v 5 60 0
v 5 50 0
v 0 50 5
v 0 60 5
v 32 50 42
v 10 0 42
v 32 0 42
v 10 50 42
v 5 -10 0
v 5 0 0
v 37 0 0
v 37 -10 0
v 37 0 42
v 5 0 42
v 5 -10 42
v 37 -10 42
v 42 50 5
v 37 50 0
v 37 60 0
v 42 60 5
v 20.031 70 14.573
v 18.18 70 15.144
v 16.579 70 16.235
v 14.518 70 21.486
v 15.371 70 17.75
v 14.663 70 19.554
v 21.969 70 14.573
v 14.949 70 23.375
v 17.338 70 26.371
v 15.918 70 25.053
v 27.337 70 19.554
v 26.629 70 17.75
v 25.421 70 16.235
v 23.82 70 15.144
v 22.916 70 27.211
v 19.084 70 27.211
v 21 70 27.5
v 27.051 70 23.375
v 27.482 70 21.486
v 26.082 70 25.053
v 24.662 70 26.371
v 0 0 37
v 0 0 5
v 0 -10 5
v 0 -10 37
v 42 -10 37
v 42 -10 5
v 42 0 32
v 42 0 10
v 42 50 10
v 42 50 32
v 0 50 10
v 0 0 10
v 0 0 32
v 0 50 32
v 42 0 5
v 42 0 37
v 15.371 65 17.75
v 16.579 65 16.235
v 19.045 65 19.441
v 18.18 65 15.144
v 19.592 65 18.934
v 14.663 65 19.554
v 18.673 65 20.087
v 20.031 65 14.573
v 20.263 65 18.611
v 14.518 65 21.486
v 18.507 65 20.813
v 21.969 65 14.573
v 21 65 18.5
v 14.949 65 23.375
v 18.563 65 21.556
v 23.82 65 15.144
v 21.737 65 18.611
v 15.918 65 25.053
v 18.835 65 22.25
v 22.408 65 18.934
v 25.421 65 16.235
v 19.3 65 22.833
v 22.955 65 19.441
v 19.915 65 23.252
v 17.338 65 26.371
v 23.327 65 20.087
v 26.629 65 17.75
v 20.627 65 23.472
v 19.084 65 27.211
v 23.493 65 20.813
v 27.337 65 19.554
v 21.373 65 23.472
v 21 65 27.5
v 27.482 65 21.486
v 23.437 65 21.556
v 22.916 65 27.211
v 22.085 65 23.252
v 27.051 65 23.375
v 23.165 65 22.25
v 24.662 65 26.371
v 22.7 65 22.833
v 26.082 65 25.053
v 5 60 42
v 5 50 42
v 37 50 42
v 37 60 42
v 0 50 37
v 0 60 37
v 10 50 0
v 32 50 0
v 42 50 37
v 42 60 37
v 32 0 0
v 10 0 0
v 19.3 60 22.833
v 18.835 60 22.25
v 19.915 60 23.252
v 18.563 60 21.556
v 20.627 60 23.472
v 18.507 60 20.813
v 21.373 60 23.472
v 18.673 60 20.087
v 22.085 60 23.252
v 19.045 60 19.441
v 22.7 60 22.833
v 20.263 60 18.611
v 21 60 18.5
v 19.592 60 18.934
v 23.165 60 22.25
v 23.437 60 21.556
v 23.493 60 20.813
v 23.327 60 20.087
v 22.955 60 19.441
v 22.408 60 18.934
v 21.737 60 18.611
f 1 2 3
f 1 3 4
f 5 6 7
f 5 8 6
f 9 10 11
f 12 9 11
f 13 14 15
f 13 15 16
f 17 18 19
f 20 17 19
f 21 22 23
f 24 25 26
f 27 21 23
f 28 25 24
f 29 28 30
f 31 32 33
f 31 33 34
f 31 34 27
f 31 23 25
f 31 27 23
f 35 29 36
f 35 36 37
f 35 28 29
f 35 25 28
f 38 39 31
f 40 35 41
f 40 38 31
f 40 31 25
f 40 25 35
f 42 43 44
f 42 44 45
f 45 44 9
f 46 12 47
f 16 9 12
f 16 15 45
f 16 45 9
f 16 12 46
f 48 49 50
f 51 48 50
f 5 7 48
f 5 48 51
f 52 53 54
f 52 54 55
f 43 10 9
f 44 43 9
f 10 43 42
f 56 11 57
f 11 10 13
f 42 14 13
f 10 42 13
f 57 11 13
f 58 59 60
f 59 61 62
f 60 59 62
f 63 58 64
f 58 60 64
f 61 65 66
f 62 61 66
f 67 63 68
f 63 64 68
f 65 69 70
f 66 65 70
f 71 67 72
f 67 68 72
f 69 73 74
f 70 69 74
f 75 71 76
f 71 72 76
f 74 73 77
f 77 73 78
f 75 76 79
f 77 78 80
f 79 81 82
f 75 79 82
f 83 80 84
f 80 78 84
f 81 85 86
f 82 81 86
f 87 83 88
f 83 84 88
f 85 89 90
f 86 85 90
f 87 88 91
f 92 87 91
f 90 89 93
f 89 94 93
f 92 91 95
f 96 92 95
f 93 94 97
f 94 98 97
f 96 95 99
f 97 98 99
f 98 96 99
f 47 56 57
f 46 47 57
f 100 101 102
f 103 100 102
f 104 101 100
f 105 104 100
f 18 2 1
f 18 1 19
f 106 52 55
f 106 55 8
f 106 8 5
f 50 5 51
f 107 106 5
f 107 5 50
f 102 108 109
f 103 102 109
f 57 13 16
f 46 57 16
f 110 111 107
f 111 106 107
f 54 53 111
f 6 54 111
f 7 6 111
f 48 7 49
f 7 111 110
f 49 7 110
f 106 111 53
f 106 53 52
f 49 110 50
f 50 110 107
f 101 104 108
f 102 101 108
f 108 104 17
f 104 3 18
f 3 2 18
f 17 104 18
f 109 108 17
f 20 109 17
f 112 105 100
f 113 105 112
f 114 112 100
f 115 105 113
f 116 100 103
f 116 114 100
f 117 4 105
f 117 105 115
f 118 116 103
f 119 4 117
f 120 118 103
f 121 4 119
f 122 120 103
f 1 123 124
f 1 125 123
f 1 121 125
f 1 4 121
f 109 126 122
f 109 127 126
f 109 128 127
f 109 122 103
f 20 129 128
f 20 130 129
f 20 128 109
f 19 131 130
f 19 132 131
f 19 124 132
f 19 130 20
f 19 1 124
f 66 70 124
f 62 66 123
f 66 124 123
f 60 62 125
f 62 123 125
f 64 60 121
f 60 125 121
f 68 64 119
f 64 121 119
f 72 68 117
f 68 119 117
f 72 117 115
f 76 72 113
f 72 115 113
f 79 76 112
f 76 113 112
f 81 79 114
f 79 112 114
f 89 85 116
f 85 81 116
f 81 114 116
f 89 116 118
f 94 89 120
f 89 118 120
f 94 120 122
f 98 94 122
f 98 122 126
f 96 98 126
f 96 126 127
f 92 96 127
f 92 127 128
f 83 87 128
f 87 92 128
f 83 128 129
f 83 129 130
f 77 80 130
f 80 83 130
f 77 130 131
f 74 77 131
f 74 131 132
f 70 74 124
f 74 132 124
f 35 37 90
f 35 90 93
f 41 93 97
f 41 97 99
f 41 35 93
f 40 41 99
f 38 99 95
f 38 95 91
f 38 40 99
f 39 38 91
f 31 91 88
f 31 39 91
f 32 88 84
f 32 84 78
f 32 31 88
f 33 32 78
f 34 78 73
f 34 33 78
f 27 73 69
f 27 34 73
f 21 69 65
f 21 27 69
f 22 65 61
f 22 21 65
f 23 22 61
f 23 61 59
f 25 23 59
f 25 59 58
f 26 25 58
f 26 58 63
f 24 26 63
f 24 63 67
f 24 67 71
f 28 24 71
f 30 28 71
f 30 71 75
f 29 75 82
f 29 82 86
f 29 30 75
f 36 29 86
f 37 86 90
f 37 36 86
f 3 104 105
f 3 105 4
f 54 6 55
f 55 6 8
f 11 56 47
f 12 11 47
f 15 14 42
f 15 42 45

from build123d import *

# Parameters (mm, degrees)
SKETCH_1_W      = 42
SKETCH_1_H      = 50
EXTRUDE_1_DEPTH = 42
CHAMFER_1_SIZE  = 10
SKETCH_2_W      = 42
SKETCH_2_H      = 42
EXTRUDE_2_DEPTH = 10
SKETCH_3_W      = 42
SKETCH_3_H      = 42
EXTRUDE_3_DEPTH = 10
CHAMFER_2_SIZE  = 5
CHAMFER_3_SIZE  = 5
SKETCH_4_R      = 2.5
EXTRUDE_4_DEPTH = 10
SKETCH_5_R      = 6.5
EXTRUDE_5_DEPTH = 5


with BuildPart() as part:
    # 草圖1 → 填料-伸長1 (new body)
    with BuildSketch(Plane.XY):
        with Locations((21, 25)):
            Rectangle(SKETCH_1_W, SKETCH_1_H)
    extrude(amount=EXTRUDE_1_DEPTH)

    # 導角1
    chamfer_1_edges = [part.edges().sort_by_distance(p)[0] for p in [
        (42, 25, 42),
        (0, 25, 42),
        (42, 25, 0),
        (0, 25, 0),
    ]]
    chamfer(chamfer_1_edges, length=CHAMFER_1_SIZE)


with BuildPart() as body_2:
    # 草圖2 → 填料-伸長2 (new body)
    with BuildSketch(Plane(origin=(0, 50, 0), x_dir=(1, 0, 0), z_dir=(0, 1, 0))):
        with Locations((21, -21)):
            Rectangle(SKETCH_2_W, SKETCH_2_H)
    extrude(amount=EXTRUDE_2_DEPTH)

    # 導角2
    chamfer_2_edges = [body_2.edges().sort_by_distance(p)[0] for p in [
        (0, 55, 0),
        (42, 55, 0),
        (42, 55, 42),
        (0, 55, 42),
    ]]
    chamfer(chamfer_2_edges, length=CHAMFER_2_SIZE)

    # 草圖4 → 填料-伸長4 (add)
    with BuildSketch(Plane(origin=(0, 60, 0), x_dir=(1, 0, 0), z_dir=(0, 1, 0))):
        with Locations(Location((21, -21, 0), (0, 0, 90))):
            Circle(SKETCH_4_R)
    extrude(amount=EXTRUDE_4_DEPTH)

    # 草圖5 → 填料-伸長5 (add)
    with BuildSketch(Plane(origin=(0, 70, 0), x_dir=(1, 0, 0), z_dir=(0, 1, 0))):
        with Locations(Location((21, -21, 0), (0, 0, 270))):
            Circle(SKETCH_5_R)
    extrude(amount=-EXTRUDE_5_DEPTH)


with BuildPart() as body_3:
    # 草圖3 → 填料-伸長3 (new body)
    with BuildSketch(Plane.XZ):
        with Locations((21, 21)):
            Rectangle(SKETCH_3_W, SKETCH_3_H)
    extrude(amount=EXTRUDE_3_DEPTH)

    # 導角3
    chamfer_3_edges = [body_3.edges().sort_by_distance(p)[0] for p in [
        (0, -5, 42),
        (42, -5, 42),
        (42, -5, 0),
        (0, -5, 0),
    ]]
    chamfer(chamfer_3_edges, length=CHAMFER_3_SIZE)


solid = Compound([part.part, body_2.part, body_3.part])
